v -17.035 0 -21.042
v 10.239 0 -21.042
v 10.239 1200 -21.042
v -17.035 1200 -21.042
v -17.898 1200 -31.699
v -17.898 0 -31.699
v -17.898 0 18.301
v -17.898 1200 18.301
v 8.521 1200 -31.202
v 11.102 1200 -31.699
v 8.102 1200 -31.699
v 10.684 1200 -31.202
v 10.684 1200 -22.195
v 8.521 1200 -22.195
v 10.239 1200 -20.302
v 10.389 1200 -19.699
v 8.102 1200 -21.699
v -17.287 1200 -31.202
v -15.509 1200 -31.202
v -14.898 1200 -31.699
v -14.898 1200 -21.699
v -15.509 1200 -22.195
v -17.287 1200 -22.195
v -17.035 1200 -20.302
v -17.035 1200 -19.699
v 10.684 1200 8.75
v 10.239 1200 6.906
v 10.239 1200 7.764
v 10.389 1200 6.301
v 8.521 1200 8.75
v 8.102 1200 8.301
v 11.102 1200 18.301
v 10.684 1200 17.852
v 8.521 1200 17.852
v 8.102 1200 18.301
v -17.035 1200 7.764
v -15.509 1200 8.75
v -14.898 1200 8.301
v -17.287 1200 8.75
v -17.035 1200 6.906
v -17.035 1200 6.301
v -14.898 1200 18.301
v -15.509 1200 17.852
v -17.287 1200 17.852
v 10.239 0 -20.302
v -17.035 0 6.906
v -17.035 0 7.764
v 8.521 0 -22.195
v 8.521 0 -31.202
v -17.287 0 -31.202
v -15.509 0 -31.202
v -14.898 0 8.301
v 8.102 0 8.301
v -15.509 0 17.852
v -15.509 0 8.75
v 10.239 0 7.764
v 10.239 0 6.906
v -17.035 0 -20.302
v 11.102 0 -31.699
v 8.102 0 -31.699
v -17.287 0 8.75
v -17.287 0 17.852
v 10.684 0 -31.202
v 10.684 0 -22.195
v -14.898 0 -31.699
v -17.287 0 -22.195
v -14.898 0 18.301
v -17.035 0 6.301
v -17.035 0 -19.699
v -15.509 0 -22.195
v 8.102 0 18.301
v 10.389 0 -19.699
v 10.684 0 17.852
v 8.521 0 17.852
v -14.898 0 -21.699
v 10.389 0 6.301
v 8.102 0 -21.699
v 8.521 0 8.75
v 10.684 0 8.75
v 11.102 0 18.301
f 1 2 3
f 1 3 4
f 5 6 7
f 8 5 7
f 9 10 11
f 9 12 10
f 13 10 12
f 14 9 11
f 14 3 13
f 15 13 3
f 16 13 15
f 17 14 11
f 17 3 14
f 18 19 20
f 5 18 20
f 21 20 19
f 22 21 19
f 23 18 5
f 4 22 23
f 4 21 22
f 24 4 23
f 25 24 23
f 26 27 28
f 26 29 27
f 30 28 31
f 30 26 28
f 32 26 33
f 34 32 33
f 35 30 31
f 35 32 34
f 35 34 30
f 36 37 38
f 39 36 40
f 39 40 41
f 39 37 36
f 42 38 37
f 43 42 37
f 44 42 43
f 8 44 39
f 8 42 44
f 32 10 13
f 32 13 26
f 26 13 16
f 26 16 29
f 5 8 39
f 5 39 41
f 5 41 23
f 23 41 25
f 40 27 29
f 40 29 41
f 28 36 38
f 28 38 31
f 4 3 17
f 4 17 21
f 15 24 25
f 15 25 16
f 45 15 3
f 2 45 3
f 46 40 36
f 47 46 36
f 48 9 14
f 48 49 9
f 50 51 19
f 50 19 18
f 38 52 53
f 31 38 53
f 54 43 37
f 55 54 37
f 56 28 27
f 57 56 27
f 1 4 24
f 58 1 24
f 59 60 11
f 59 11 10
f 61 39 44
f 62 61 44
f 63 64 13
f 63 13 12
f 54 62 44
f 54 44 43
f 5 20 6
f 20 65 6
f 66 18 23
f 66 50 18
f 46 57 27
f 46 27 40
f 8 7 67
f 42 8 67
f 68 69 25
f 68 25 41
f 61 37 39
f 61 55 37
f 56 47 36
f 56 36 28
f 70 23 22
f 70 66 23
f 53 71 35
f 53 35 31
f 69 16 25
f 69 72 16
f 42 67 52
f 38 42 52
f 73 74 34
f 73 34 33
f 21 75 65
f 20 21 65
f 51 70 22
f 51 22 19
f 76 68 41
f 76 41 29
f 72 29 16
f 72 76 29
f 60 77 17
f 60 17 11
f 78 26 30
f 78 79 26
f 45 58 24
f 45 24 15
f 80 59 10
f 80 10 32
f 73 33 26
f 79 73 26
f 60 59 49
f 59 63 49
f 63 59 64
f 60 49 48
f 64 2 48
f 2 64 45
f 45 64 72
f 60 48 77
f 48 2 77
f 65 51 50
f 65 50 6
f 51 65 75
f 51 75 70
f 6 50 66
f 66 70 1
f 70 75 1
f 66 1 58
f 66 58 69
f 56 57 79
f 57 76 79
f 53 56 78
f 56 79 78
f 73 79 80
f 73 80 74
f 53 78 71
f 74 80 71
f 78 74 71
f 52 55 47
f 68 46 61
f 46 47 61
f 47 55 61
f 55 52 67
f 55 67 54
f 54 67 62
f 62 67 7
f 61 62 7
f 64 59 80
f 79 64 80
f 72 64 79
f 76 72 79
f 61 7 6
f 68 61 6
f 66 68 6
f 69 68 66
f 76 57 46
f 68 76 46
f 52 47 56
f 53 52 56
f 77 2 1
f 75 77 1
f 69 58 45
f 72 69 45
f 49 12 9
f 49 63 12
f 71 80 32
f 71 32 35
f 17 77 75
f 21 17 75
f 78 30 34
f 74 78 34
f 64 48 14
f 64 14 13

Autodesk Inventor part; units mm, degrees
ref_plane "YZ Plane" through (0, 0, 0) normal (1, 0, 0) x (0, 1, 0)
ref_plane "XZ Plane" through (0, 0, 0) normal (0, 1, 0) x (-1, 0, 0)
ref_plane "XY Plane" through (0, 0, 0) normal (0, 0, 1) x (1, 0, 0)
sketch "Schizzo1" plane through (0, 0, 0) normal (0, 1, 0) x (-1, 0, 0)
  line L0 (14.898, -21.6987) -> (14.898, -31.6987)
  line L1 (-8.102, -21.6987) -> (-8.102, -31.6987)
  line L2 (-8.102, -31.6987) -> (-11.102, -31.6987)
  line L3 (-8.102, -21.6987) -> (14.898, -21.6987)
  line L4 (-10.3886, -19.6987) -> (17.0348, -19.6987)
  line L5 (14.898, -31.6987) -> (17.898, -31.6987)
  line L6 (17.898, -6.6987) -> (-17.7474, -6.6987) construction
  line L7 (-10.3886, 6.3013) -> (-10.3886, -19.6987)
  line L8 (17.0348, 6.3013) -> (-10.3886, 6.3013)
  line L9 (-10.3886, -19.6987) -> (17.0348, 6.3013) construction
  line L10 (17.0348, -19.6987) -> (-10.3886, 6.3013) construction
  line L11 (14.898, 8.3013) -> (-8.102, 8.3013)
  line L12 (-11.102, -31.6987) -> (-11.102, 18.3013)
  line L13 (17.898, -31.6987) -> (17.898, 18.3013)
  line L14 (-11.102, 18.3013) -> (-8.102, 18.3013)
  line L15 (14.898, 18.3013) -> (14.898, 8.3013)
  line L16 (17.898, 18.3013) -> (14.898, 18.3013)
  line L17 (17.0348, -19.6987) -> (17.0348, 6.3013)
  line L18 (-8.102, 18.3013) -> (-8.102, 8.3013)
  line L19 (17.2869, 17.8522) -> (15.509, 17.8522)
  line L20 (15.509, 17.8522) -> (15.509, 8.7505)
  line L21 (15.509, 8.7505) -> (17.2869, 8.7505)
  line L22 (17.2869, 8.7505) -> (17.2869, 17.8522)
  line L23 (17.2869, 17.8522) -> (15.509, 8.7505) construction
  line L24 (15.509, 17.8522) -> (17.2869, 8.7505) construction
  line L25 (17.2869, -22.1954) -> (15.509, -22.1954)
  line L26 (15.509, -22.1954) -> (15.509, -31.202)
  line L27 (15.509, -31.202) -> (17.2869, -31.202)
  line L28 (17.2869, -31.202) -> (17.2869, -22.1954)
  line L29 (17.2869, -22.1954) -> (15.509, -31.202) construction
  line L30 (15.509, -22.1954) -> (17.2869, -31.202) construction
  line L31 (-8.5206, -22.1954) -> (-10.6835, -22.1954)
  line L32 (-10.6835, -22.1954) -> (-10.6835, -31.202)
  line L33 (-10.6835, -31.202) -> (-8.5206, -31.202)
  line L34 (-8.5206, -31.202) -> (-8.5206, -22.1954)
  line L35 (-8.5206, -22.1954) -> (-10.6835, -31.202) construction
  line L36 (-10.6835, -22.1954) -> (-8.5206, -31.202) construction
  line L37 (-8.5206, 17.8522) -> (-10.6835, 17.8522)
  line L38 (-10.6835, 17.8522) -> (-10.6835, 8.7505)
  line L39 (-10.6835, 8.7505) -> (-8.5206, 8.7505)
  line L40 (-8.5206, 8.7505) -> (-8.5206, 17.8522)
  line L41 (-8.5206, 17.8522) -> (-10.6835, 8.7505) construction
  line L42 (-10.6835, 17.8522) -> (-8.5206, 8.7505) construction
  line L43 (-10.2389, 6.9058) -> (17.0348, 6.9058)
  line L44 (17.0348, 6.9058) -> (17.0348, 7.7637)
  line L45 (17.0348, 7.7637) -> (-10.2389, 7.7637)
  line L46 (-10.2389, 7.7637) -> (-10.2389, 6.9058)
  line L47 (-10.2389, 6.9058) -> (17.0348, 7.7637) construction
  line L48 (17.0348, 6.9058) -> (-10.2389, 7.7637) construction
  line L49 (-10.2389, -21.0418) -> (17.0348, -21.0418)
  line L50 (17.0348, -21.0418) -> (17.0348, -20.3019)
  line L51 (17.0348, -20.3019) -> (-10.2389, -20.3019)
  line L52 (-10.2389, -20.3019) -> (-10.2389, -21.0418)
  line L53 (-10.2389, -21.0418) -> (17.0348, -20.3019) construction
  line L54 (17.0348, -21.0418) -> (-10.2389, -20.3019) construction
  point P0 (0, 0)
  point P1 (0, 0)
  point P2 (3.3231, -6.6987)
  point P3 (16.398, 13.3013)
  point P4 (16.398, -26.6987)
  point P5 (-9.602, -26.6987)
  point P6 (-9.602, 13.3013)
  point P7 (3.398, 7.3347)
  point P8 (3.398, -20.6718)
  dimension "d0" = 50
  dimension "d1" = 23
  dimension "d2" = 3
  dimension "d3" = 10
  dimension "d4" = 10
  dimension "d5" = 10
  dimension "d6" = 2
  dimension "d7" = 2
extrude "Estrusione1" add sketch "Schizzo1" along normal blind 1200
properties part number "calcolo fem"
